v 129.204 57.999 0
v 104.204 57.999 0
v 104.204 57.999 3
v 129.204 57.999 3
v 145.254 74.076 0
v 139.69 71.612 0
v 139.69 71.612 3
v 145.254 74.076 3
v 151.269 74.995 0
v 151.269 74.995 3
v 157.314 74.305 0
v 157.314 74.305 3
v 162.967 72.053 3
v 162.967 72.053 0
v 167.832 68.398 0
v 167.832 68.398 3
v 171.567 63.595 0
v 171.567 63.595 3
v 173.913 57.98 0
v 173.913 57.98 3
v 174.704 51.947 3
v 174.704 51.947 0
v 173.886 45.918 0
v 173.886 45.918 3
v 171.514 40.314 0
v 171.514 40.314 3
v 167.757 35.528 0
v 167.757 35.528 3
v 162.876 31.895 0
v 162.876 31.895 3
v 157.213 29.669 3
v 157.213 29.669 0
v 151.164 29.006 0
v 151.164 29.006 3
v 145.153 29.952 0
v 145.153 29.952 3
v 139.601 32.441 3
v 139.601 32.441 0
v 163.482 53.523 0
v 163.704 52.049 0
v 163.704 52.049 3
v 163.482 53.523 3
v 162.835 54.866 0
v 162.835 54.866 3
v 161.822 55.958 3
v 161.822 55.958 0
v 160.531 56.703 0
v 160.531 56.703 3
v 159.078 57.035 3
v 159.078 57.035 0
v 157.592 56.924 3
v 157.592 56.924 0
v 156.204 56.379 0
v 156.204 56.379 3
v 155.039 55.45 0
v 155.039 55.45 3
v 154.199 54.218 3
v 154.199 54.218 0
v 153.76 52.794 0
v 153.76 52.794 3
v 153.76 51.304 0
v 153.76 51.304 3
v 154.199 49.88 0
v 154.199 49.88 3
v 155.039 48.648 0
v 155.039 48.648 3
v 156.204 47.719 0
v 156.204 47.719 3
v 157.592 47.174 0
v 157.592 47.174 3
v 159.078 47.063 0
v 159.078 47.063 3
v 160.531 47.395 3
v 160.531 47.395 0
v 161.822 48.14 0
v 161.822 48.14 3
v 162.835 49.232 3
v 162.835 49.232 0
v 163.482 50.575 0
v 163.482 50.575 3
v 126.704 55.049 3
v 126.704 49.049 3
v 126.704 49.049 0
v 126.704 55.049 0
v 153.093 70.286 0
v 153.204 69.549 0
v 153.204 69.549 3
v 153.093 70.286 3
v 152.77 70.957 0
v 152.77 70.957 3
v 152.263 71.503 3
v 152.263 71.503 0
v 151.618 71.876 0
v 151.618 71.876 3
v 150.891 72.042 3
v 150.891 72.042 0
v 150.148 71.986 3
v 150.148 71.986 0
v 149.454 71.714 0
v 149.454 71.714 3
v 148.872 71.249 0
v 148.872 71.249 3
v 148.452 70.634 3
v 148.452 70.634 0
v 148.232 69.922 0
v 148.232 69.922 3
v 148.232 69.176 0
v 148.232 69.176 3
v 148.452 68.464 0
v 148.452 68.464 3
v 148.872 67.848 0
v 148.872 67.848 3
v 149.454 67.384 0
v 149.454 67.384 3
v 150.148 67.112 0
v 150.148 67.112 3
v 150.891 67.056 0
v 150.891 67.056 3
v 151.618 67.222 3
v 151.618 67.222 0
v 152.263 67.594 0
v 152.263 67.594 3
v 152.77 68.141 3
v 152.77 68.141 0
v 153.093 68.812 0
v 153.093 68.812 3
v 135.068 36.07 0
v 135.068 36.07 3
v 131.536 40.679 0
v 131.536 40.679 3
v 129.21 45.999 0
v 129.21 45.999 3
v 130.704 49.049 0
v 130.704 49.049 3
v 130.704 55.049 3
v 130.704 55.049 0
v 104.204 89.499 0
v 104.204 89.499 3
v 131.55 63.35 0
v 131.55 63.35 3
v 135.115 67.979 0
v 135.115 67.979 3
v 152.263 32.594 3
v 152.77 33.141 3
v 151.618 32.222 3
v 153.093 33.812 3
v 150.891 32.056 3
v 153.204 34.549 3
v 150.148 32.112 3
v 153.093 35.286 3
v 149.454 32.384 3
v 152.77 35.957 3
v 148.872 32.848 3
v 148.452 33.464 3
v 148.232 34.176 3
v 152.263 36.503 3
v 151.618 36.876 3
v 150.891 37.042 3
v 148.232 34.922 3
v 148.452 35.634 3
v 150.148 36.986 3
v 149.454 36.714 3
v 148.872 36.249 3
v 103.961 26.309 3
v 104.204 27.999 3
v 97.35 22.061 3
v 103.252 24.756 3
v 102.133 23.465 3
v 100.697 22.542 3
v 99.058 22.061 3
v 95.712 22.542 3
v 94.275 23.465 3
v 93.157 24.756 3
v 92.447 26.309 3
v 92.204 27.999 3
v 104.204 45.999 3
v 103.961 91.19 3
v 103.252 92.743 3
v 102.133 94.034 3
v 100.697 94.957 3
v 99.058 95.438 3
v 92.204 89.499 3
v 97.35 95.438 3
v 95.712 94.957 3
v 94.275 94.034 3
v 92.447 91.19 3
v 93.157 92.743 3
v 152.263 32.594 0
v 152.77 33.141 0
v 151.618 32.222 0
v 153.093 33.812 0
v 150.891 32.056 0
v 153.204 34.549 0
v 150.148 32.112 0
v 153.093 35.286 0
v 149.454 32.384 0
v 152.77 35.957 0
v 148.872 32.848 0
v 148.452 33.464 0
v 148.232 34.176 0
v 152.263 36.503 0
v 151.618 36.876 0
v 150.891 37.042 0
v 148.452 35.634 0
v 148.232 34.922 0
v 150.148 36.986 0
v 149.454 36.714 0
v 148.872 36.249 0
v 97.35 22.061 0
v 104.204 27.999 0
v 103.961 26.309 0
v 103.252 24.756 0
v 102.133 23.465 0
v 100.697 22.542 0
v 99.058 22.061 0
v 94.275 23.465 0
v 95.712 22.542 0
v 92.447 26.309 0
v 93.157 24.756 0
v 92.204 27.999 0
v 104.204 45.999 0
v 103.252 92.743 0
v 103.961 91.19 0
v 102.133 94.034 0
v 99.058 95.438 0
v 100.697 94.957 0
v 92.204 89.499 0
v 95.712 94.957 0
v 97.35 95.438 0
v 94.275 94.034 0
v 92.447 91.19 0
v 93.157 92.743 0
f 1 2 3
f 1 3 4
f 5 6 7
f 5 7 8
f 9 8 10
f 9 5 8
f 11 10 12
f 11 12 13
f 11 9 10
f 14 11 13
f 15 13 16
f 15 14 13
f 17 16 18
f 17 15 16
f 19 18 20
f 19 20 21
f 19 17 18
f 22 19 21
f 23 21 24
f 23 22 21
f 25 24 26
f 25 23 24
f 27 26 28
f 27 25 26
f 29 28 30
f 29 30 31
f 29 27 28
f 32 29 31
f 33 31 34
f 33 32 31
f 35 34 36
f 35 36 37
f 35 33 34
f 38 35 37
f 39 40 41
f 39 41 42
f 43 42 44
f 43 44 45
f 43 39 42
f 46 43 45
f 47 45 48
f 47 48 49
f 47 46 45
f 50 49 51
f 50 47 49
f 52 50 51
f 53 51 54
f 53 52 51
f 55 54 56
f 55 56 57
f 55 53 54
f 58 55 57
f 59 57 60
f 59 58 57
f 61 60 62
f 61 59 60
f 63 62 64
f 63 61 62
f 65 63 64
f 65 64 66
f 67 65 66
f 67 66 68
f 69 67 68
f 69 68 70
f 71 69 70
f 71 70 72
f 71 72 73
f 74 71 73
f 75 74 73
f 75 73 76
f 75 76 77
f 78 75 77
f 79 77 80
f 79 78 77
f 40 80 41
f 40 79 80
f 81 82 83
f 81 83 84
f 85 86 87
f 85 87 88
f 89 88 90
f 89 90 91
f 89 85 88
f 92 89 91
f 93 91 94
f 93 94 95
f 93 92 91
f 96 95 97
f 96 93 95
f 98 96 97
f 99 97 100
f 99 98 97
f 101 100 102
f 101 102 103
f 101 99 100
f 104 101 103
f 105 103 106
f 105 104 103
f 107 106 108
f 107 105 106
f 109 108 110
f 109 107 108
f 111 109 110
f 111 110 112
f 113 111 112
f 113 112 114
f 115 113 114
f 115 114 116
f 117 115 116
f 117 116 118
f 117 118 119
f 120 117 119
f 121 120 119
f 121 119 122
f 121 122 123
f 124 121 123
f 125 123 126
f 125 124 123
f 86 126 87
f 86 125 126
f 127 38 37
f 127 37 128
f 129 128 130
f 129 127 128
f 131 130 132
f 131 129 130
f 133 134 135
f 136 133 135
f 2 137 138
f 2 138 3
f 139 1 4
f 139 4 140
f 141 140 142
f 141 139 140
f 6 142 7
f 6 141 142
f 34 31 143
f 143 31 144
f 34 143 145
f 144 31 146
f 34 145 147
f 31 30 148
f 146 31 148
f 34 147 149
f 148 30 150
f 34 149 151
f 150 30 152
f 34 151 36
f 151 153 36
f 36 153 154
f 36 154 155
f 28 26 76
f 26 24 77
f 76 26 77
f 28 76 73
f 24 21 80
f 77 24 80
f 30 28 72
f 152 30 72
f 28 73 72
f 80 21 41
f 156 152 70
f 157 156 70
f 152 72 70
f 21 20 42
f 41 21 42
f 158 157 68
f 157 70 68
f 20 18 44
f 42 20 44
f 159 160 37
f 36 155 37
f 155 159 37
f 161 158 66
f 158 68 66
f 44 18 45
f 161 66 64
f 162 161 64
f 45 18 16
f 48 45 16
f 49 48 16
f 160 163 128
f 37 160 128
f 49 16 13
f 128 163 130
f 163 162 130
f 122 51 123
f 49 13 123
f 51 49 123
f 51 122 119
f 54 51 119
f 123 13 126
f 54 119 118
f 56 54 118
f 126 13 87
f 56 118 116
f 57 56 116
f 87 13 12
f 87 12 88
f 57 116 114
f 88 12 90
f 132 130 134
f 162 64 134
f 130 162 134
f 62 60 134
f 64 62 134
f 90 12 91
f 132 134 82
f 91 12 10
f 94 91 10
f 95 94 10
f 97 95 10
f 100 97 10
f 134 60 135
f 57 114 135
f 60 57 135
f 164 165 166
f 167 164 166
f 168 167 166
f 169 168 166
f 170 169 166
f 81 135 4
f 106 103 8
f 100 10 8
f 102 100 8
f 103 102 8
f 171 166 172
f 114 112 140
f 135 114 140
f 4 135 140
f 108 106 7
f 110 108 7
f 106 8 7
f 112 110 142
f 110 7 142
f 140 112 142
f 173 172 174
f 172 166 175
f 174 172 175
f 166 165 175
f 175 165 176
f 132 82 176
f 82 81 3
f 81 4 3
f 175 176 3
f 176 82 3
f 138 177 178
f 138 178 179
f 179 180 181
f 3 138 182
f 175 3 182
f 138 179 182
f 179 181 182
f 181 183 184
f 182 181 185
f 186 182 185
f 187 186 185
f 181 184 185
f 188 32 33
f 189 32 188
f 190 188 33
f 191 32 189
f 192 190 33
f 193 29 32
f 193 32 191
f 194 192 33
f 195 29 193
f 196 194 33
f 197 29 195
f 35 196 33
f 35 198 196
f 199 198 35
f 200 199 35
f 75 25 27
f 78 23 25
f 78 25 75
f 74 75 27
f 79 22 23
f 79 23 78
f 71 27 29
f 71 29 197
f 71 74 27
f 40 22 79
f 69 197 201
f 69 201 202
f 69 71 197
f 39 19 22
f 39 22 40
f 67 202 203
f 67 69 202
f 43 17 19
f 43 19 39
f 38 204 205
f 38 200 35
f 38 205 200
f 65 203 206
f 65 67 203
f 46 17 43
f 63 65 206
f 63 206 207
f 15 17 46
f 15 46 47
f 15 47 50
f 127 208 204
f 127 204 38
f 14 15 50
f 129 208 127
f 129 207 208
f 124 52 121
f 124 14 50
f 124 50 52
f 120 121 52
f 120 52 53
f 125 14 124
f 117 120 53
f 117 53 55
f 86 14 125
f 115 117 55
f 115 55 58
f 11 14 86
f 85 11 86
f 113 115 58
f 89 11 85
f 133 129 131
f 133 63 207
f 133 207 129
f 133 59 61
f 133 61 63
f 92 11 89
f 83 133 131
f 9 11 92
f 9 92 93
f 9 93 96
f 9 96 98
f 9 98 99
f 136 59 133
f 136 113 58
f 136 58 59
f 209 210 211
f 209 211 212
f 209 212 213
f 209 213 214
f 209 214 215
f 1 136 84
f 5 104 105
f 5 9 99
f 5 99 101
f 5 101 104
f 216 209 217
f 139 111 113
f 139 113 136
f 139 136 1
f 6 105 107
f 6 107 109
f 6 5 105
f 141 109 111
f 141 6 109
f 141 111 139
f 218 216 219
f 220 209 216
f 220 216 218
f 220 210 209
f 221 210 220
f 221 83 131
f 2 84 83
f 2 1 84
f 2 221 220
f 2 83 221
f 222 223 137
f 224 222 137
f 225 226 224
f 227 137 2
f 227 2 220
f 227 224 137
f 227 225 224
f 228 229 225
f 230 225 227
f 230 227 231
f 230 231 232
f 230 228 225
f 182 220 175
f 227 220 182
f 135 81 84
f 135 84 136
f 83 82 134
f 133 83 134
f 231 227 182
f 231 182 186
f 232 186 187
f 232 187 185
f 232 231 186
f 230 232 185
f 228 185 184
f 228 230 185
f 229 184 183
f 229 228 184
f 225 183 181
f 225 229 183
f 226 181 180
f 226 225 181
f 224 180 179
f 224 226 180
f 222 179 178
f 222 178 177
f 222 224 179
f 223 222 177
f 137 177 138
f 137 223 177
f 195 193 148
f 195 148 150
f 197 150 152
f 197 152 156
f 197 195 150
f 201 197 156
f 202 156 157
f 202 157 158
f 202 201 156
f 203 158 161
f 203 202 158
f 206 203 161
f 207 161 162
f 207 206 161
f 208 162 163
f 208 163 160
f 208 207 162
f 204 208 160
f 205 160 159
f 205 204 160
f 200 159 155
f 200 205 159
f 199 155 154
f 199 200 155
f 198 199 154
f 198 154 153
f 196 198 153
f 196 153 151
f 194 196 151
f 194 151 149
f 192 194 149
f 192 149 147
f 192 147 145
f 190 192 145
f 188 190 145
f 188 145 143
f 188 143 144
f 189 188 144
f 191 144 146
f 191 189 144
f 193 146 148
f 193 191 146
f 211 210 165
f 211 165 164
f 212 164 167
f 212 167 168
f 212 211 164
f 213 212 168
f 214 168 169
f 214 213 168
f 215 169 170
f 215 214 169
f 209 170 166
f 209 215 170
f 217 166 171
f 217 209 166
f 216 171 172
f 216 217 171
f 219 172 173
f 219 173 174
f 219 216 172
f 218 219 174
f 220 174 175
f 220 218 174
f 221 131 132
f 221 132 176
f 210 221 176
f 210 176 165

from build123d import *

# Parameters (mm, degrees)
SKETCH_1_R          = 5
SKETCH_1_R_2        = 2.5
EXTRUDE_1_DEPTH     = 3
SKETCH_2_W          = 4
SKETCH_2_H          = 6
CUT_EXTRUDE_1_DEPTH = 3


with BuildPart() as part:
    # 草图1 → 凸台-拉伸1 (new body)
    with BuildSketch(Plane.XY):
        with BuildLine():
            Line((104.204193709, 89.499436202), (104.204193709, 57.999436202))
            Line((104.204193709, 57.999436202), (129.204193709, 57.999436202))
            ThreePointArc((129.204193709, 57.999436202), (133.19157799, 65.772898709), (139.689971603, 71.61214808))
            ThreePointArc((139.689971603, 71.61214808), (174.704134434, 51.947219111), (139.601041877, 32.44147834))
            ThreePointArc((139.601041877, 32.44147834), (133.162334619, 38.267746144), (129.209700495, 45.999436202))
            Line((129.209700495, 45.999436202), (104.204193709, 45.999436202))
            Line((104.204193709, 45.999436202), (104.204193709, 27.999436202))
            ThreePointArc((104.204193709, 27.999436202), (98.204193709, 21.999436202), (92.204193709, 27.999436202))
            Line((92.204193709, 27.999436202), (92.204193709, 89.499436202))
            ThreePointArc((92.204193709, 89.499436202), (98.204193709, 95.499436202), (104.204193709, 89.499436202))
        make_face()
        with Locations((158.704193709, 52.048919583)):
            Circle(SKETCH_1_R, mode=Mode.SUBTRACT)
        with Locations((150.704193709, 69.548919583)):
            Circle(SKETCH_1_R_2, mode=Mode.SUBTRACT)
        with Locations((150.704193709, 34.548919583)):
            Circle(SKETCH_1_R_2, mode=Mode.SUBTRACT)
    extrude(amount=EXTRUDE_1_DEPTH)

    # 草图2 → 切除-拉伸1 (cut)
    with BuildSketch(Plane.XY.offset(3)):
        with Locations((128.704193709, 52.048919583)):
            Rectangle(SKETCH_2_W, SKETCH_2_H)
    extrude(amount=-CUT_EXTRUDE_1_DEPTH, mode=Mode.SUBTRACT)


solid = part.part
